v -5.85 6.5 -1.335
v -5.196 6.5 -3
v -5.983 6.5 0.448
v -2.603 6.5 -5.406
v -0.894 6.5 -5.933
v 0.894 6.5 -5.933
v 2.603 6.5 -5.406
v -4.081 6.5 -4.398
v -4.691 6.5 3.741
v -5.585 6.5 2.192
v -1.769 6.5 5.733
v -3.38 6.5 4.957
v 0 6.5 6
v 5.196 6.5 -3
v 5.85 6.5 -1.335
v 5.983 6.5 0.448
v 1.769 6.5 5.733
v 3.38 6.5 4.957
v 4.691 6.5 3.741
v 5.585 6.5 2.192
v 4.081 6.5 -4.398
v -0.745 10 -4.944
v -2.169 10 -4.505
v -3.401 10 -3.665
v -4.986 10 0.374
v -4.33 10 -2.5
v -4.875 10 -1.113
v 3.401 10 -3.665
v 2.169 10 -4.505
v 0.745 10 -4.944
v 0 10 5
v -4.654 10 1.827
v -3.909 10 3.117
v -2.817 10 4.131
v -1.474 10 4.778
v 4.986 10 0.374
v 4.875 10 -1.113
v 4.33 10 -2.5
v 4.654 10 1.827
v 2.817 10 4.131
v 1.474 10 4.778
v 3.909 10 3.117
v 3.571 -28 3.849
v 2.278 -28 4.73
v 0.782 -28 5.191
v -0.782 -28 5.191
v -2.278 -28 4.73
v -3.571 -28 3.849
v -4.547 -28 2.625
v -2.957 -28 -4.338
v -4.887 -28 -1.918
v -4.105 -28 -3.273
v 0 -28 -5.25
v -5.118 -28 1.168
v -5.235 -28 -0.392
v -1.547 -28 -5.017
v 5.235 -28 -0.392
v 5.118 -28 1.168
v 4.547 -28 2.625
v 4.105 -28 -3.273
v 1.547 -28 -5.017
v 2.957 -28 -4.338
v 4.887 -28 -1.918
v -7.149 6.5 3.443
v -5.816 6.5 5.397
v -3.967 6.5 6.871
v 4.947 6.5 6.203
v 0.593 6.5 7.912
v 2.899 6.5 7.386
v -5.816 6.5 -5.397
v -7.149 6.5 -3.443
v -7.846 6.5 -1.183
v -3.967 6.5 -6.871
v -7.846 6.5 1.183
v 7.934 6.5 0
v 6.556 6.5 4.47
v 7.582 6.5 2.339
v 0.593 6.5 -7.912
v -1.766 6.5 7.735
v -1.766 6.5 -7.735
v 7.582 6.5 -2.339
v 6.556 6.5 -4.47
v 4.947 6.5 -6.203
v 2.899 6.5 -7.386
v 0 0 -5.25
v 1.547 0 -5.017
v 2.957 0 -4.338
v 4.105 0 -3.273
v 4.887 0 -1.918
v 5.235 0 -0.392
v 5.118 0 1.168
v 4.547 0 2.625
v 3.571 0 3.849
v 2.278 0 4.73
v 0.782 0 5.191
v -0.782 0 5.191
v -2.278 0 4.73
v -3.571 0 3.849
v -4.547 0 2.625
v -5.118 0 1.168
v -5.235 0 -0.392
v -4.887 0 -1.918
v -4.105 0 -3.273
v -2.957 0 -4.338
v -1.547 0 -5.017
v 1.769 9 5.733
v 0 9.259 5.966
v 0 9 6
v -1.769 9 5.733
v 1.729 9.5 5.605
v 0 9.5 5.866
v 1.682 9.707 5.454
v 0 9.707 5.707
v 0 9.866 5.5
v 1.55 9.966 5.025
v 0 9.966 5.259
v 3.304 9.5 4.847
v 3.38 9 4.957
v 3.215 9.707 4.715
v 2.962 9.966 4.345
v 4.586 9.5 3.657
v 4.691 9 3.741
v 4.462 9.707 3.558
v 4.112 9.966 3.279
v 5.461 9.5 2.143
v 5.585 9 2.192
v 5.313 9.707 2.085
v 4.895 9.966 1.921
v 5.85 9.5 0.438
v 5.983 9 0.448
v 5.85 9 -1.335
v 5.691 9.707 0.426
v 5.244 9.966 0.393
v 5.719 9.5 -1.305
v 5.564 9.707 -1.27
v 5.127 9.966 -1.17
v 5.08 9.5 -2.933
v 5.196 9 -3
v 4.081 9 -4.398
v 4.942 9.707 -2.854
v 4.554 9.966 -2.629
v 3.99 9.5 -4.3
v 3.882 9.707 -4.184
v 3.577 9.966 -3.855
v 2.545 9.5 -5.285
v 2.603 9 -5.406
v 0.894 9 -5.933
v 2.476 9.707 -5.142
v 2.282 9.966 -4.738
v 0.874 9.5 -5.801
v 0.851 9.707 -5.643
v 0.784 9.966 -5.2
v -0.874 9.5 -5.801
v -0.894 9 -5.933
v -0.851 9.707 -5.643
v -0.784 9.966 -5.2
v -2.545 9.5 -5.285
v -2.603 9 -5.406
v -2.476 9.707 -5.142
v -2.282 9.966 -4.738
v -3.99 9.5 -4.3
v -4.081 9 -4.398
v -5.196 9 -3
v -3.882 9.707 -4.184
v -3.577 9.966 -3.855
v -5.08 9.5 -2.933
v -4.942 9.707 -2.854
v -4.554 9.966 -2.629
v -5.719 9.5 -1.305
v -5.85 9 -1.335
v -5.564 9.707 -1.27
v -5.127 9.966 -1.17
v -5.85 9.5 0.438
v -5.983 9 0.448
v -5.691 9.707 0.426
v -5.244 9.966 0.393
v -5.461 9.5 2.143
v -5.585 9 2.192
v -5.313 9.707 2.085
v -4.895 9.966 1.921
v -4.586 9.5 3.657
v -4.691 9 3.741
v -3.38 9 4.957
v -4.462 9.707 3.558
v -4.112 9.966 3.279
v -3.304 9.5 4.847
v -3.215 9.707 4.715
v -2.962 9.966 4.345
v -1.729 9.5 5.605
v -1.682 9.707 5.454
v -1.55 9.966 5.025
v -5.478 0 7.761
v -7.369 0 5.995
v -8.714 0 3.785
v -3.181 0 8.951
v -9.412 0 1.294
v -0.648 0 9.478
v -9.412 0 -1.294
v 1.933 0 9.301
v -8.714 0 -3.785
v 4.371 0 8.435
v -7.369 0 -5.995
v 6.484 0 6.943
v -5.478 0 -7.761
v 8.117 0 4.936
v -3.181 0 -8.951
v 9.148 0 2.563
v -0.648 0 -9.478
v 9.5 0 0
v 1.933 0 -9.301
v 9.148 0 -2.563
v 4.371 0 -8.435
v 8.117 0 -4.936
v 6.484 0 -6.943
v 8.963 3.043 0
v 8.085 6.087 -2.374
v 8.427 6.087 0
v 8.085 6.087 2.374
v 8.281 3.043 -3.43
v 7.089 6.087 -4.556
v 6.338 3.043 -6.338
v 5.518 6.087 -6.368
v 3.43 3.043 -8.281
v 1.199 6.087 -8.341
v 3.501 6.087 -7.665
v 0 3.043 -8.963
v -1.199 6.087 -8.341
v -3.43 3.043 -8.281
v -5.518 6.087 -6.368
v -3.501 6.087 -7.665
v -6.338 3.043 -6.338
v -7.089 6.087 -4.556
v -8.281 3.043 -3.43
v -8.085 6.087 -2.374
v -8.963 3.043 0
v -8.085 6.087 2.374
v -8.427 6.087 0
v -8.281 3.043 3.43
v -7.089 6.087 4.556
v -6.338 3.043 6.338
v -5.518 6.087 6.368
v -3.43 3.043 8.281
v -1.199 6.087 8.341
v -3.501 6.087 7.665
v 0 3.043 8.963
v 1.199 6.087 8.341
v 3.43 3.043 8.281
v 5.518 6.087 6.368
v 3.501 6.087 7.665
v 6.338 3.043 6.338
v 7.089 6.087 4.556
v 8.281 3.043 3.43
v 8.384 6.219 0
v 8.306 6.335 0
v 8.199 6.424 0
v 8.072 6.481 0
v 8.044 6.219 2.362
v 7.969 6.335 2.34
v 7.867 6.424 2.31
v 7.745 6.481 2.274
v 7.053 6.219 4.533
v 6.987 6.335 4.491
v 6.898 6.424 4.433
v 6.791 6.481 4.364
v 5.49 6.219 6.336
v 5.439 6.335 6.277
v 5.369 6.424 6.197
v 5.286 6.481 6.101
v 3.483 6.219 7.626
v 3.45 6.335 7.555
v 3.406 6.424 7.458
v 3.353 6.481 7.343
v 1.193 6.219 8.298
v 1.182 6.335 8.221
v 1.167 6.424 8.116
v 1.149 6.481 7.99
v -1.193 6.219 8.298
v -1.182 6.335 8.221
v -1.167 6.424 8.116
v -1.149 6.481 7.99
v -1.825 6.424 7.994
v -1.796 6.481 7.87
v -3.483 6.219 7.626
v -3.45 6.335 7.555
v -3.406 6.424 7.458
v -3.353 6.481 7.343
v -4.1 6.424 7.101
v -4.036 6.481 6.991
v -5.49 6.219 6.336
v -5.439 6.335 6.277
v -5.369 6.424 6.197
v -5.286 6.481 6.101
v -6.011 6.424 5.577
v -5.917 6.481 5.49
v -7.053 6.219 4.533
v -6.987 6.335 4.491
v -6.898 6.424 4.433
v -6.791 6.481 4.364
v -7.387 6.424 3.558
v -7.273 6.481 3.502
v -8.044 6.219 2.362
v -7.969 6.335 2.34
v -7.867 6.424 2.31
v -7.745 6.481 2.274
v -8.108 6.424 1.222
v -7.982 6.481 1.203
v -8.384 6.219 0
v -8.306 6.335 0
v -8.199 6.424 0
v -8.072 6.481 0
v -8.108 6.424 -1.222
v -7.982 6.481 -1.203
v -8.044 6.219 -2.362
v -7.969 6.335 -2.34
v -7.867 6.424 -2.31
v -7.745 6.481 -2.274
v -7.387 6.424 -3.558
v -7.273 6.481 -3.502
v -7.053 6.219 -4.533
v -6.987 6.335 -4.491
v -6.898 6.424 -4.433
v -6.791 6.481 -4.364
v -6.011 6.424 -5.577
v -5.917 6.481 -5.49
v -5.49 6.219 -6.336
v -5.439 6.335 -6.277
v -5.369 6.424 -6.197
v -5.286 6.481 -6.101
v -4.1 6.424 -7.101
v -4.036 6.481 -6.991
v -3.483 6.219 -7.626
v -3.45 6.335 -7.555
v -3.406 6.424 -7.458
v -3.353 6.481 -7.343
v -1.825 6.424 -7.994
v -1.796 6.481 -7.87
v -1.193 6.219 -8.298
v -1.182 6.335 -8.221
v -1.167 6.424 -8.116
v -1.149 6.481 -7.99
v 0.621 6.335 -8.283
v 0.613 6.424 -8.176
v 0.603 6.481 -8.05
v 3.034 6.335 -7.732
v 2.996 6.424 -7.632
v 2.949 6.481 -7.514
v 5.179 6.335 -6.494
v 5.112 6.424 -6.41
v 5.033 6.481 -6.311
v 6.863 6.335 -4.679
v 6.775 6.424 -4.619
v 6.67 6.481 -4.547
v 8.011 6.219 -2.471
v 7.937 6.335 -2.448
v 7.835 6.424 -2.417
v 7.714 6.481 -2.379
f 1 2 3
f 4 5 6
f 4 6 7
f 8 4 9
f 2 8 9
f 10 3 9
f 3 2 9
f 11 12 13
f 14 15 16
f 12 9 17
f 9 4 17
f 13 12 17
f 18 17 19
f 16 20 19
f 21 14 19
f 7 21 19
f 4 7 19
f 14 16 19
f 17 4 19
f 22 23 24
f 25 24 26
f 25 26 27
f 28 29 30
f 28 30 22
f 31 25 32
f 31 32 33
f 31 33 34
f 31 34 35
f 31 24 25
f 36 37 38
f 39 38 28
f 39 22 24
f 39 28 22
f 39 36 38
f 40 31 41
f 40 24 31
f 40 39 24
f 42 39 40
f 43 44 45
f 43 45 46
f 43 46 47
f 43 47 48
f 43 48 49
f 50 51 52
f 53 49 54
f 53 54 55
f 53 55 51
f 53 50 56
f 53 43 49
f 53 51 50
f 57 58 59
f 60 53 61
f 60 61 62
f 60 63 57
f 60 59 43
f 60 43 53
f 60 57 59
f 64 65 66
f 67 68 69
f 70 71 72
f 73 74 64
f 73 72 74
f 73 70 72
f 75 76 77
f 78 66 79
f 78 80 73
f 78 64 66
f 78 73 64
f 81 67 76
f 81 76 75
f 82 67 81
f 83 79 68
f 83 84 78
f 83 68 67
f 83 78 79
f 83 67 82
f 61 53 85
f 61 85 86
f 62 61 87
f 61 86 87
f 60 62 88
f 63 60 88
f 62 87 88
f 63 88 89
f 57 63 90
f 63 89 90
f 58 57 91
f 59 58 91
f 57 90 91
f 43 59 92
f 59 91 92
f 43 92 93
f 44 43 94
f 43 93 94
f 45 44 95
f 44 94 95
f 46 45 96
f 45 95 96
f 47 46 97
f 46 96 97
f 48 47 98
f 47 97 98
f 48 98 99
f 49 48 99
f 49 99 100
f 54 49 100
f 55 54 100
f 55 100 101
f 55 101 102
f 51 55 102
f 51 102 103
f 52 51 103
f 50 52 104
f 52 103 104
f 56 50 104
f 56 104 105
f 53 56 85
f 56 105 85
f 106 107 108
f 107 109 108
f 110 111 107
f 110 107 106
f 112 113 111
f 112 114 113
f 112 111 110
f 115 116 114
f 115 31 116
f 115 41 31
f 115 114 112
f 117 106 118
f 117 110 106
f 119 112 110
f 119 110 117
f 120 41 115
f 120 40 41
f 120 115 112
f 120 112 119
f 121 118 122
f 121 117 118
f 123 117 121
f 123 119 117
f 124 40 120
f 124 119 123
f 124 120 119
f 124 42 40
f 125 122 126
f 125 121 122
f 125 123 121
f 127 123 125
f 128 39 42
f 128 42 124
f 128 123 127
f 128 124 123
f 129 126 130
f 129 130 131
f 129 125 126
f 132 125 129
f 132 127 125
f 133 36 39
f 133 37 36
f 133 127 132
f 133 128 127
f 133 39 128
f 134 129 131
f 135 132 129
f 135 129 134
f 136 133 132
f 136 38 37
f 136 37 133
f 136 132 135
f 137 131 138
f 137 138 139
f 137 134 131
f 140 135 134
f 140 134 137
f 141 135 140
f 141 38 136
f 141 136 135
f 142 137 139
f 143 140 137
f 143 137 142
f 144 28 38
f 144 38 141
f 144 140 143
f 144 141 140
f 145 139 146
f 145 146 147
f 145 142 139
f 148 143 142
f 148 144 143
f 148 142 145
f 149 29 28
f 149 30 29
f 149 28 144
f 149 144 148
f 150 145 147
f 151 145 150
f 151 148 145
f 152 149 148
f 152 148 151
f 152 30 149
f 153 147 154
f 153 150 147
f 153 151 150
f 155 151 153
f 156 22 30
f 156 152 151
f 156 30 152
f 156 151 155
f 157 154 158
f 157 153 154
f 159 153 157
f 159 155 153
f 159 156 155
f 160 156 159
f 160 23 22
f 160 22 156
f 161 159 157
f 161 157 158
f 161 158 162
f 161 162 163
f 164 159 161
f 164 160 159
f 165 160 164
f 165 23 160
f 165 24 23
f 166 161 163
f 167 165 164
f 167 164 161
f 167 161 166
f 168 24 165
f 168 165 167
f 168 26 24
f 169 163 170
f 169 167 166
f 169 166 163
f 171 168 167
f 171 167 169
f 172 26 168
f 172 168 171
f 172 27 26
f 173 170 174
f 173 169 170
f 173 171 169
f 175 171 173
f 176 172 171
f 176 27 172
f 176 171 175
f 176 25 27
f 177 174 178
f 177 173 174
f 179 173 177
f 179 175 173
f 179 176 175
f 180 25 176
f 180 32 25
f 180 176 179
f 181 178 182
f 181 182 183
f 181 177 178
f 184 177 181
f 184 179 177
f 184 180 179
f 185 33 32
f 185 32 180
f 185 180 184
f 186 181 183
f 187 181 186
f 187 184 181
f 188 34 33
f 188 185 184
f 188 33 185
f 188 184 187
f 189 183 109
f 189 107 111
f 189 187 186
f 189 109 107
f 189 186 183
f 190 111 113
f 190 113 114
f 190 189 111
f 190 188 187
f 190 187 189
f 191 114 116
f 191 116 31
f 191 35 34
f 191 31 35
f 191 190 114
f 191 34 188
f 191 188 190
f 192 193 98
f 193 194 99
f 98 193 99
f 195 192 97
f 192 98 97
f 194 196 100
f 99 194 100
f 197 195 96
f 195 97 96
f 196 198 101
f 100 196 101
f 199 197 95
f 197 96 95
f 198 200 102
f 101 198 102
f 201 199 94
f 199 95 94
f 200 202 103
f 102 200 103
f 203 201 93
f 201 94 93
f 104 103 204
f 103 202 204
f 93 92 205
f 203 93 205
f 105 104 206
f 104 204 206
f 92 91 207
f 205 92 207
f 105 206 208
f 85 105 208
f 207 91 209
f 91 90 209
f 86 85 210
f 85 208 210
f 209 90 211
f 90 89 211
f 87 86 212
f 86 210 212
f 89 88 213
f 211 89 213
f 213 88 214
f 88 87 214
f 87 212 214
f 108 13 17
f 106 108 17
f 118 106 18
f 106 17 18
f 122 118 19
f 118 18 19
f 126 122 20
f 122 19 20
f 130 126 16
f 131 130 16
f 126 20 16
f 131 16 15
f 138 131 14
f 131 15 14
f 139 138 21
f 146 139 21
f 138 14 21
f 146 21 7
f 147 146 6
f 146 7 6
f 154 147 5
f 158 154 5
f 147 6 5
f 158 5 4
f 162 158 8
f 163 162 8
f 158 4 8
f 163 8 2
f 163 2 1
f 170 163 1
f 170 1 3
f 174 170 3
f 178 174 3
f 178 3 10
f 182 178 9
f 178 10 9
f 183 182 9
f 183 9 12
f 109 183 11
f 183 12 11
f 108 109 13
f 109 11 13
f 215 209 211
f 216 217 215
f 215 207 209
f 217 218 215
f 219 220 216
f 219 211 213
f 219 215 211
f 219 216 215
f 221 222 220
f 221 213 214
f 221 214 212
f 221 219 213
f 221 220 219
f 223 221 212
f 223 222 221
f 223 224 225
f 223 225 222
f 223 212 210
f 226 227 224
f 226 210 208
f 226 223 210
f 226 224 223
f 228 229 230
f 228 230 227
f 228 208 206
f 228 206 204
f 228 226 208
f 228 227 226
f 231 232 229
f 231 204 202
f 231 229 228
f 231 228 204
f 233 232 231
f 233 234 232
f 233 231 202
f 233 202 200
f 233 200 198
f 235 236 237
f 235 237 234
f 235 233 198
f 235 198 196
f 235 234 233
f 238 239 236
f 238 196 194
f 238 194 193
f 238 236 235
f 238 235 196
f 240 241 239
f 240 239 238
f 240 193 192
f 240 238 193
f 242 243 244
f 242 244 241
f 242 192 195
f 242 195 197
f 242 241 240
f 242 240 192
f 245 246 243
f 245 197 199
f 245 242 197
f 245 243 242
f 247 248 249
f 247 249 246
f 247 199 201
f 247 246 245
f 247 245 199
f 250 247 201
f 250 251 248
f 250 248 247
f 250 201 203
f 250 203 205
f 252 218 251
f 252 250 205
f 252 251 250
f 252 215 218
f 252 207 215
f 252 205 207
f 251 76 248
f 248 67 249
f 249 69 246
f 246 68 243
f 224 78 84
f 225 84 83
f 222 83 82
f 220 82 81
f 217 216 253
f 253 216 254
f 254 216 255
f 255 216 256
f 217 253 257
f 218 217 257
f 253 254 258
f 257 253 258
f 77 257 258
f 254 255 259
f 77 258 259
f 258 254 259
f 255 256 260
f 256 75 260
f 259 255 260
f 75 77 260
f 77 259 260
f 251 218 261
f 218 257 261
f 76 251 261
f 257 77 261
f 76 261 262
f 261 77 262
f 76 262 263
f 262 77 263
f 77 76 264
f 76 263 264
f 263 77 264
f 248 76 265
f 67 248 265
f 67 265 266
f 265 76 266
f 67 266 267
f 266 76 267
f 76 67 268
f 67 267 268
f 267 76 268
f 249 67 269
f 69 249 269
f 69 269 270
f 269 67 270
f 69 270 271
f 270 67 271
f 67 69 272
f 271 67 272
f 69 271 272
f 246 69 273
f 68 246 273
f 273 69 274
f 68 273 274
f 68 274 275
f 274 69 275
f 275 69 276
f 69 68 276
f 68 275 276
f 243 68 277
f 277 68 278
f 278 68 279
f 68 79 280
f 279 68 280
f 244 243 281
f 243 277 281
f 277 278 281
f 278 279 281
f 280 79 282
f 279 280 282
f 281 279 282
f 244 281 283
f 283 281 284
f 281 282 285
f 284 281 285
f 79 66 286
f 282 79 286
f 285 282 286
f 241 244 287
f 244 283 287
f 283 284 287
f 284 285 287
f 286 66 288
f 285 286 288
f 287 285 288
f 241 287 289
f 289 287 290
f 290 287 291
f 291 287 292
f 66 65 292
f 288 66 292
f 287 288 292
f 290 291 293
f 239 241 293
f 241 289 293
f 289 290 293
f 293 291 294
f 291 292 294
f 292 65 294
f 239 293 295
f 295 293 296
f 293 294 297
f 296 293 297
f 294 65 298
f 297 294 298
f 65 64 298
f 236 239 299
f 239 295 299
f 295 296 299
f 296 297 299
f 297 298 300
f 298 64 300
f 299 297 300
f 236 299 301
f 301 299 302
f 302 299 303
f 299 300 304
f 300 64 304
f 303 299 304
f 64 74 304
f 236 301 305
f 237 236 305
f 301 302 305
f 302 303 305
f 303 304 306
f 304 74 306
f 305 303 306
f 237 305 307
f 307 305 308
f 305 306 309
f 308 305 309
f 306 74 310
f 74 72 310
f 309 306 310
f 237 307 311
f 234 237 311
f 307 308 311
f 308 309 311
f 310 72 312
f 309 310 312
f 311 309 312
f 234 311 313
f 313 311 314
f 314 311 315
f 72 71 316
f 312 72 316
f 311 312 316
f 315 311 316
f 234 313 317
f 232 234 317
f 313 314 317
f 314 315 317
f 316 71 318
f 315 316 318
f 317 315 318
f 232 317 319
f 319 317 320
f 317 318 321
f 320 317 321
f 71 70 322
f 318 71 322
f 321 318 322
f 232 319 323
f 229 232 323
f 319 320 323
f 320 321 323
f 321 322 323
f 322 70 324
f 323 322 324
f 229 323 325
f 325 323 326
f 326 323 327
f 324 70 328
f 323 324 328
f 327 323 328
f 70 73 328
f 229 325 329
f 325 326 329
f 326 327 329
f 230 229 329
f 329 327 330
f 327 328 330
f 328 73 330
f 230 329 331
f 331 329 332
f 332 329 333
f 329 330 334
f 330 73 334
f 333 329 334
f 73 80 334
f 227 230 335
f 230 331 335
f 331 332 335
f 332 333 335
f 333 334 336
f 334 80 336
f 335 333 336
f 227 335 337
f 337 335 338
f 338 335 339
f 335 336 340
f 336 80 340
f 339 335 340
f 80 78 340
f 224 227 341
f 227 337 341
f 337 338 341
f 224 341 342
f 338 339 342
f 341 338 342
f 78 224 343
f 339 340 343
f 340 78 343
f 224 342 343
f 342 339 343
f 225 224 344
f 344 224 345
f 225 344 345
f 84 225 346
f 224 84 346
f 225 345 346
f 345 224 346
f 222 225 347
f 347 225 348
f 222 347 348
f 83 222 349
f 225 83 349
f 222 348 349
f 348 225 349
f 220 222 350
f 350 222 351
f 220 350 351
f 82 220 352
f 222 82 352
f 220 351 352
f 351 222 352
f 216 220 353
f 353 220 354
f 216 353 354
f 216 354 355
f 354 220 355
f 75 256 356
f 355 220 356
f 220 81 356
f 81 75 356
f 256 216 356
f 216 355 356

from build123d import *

# Parameters (mm, degrees)
SKETCH1_R           = 9.5
BOSS_EXTRUDE1_DEPTH = 6.5
BOSS_EXTRUDE1_TAPER = 10
SKETCH2_R           = 6
BOSS_EXTRUDE2_DEPTH = 3.5
SKETCH3_R           = 5.25
BOSS_EXTRUDE3_DEPTH = 28
FILLET1_R           = 1
FILLET2_R           = 0.5


with BuildPart() as part:
    # Sketch1 → Boss-Extrude1 (new body)
    with BuildSketch(Plane(origin=(0, 0, 0), x_dir=(1, 0, 0), z_dir=(0, 1, 0))):
        Circle(SKETCH1_R)
    extrude(amount=BOSS_EXTRUDE1_DEPTH, taper=BOSS_EXTRUDE1_TAPER)

    # Sketch3 → Boss-Extrude3 (add)
    with BuildSketch(Plane.XZ):
        with Locations(Location((0, 0, 0), (0, 0, 270))):
            Circle(SKETCH3_R)
    extrude(amount=BOSS_EXTRUDE3_DEPTH)

    # Fillet2
    fillet2_edges = [part.edges().sort_by_distance(p)[0] for p in [
        (-8.353874625, 6.5, 0),
    ]]
    fillet(fillet2_edges, radius=FILLET2_R)


with BuildPart() as body_2:
    # Sketch2 → Boss-Extrude2 (new body)
    with BuildSketch(Plane(origin=(0, 6.5, 0), x_dir=(1, 0, 0), z_dir=(0, 1, 0))):
        with Locations(Location((0, 0, 0), (0, 0, 270))):
            Circle(SKETCH2_R)
    extrude(amount=BOSS_EXTRUDE2_DEPTH)

    # Fillet1
    fillet1_edges = [body_2.edges().sort_by_distance(p)[0] for p in [
        (0, 10, -6),
    ]]
    fillet(fillet1_edges, radius=FILLET1_R)


solid = Compound([part.part, body_2.part])
